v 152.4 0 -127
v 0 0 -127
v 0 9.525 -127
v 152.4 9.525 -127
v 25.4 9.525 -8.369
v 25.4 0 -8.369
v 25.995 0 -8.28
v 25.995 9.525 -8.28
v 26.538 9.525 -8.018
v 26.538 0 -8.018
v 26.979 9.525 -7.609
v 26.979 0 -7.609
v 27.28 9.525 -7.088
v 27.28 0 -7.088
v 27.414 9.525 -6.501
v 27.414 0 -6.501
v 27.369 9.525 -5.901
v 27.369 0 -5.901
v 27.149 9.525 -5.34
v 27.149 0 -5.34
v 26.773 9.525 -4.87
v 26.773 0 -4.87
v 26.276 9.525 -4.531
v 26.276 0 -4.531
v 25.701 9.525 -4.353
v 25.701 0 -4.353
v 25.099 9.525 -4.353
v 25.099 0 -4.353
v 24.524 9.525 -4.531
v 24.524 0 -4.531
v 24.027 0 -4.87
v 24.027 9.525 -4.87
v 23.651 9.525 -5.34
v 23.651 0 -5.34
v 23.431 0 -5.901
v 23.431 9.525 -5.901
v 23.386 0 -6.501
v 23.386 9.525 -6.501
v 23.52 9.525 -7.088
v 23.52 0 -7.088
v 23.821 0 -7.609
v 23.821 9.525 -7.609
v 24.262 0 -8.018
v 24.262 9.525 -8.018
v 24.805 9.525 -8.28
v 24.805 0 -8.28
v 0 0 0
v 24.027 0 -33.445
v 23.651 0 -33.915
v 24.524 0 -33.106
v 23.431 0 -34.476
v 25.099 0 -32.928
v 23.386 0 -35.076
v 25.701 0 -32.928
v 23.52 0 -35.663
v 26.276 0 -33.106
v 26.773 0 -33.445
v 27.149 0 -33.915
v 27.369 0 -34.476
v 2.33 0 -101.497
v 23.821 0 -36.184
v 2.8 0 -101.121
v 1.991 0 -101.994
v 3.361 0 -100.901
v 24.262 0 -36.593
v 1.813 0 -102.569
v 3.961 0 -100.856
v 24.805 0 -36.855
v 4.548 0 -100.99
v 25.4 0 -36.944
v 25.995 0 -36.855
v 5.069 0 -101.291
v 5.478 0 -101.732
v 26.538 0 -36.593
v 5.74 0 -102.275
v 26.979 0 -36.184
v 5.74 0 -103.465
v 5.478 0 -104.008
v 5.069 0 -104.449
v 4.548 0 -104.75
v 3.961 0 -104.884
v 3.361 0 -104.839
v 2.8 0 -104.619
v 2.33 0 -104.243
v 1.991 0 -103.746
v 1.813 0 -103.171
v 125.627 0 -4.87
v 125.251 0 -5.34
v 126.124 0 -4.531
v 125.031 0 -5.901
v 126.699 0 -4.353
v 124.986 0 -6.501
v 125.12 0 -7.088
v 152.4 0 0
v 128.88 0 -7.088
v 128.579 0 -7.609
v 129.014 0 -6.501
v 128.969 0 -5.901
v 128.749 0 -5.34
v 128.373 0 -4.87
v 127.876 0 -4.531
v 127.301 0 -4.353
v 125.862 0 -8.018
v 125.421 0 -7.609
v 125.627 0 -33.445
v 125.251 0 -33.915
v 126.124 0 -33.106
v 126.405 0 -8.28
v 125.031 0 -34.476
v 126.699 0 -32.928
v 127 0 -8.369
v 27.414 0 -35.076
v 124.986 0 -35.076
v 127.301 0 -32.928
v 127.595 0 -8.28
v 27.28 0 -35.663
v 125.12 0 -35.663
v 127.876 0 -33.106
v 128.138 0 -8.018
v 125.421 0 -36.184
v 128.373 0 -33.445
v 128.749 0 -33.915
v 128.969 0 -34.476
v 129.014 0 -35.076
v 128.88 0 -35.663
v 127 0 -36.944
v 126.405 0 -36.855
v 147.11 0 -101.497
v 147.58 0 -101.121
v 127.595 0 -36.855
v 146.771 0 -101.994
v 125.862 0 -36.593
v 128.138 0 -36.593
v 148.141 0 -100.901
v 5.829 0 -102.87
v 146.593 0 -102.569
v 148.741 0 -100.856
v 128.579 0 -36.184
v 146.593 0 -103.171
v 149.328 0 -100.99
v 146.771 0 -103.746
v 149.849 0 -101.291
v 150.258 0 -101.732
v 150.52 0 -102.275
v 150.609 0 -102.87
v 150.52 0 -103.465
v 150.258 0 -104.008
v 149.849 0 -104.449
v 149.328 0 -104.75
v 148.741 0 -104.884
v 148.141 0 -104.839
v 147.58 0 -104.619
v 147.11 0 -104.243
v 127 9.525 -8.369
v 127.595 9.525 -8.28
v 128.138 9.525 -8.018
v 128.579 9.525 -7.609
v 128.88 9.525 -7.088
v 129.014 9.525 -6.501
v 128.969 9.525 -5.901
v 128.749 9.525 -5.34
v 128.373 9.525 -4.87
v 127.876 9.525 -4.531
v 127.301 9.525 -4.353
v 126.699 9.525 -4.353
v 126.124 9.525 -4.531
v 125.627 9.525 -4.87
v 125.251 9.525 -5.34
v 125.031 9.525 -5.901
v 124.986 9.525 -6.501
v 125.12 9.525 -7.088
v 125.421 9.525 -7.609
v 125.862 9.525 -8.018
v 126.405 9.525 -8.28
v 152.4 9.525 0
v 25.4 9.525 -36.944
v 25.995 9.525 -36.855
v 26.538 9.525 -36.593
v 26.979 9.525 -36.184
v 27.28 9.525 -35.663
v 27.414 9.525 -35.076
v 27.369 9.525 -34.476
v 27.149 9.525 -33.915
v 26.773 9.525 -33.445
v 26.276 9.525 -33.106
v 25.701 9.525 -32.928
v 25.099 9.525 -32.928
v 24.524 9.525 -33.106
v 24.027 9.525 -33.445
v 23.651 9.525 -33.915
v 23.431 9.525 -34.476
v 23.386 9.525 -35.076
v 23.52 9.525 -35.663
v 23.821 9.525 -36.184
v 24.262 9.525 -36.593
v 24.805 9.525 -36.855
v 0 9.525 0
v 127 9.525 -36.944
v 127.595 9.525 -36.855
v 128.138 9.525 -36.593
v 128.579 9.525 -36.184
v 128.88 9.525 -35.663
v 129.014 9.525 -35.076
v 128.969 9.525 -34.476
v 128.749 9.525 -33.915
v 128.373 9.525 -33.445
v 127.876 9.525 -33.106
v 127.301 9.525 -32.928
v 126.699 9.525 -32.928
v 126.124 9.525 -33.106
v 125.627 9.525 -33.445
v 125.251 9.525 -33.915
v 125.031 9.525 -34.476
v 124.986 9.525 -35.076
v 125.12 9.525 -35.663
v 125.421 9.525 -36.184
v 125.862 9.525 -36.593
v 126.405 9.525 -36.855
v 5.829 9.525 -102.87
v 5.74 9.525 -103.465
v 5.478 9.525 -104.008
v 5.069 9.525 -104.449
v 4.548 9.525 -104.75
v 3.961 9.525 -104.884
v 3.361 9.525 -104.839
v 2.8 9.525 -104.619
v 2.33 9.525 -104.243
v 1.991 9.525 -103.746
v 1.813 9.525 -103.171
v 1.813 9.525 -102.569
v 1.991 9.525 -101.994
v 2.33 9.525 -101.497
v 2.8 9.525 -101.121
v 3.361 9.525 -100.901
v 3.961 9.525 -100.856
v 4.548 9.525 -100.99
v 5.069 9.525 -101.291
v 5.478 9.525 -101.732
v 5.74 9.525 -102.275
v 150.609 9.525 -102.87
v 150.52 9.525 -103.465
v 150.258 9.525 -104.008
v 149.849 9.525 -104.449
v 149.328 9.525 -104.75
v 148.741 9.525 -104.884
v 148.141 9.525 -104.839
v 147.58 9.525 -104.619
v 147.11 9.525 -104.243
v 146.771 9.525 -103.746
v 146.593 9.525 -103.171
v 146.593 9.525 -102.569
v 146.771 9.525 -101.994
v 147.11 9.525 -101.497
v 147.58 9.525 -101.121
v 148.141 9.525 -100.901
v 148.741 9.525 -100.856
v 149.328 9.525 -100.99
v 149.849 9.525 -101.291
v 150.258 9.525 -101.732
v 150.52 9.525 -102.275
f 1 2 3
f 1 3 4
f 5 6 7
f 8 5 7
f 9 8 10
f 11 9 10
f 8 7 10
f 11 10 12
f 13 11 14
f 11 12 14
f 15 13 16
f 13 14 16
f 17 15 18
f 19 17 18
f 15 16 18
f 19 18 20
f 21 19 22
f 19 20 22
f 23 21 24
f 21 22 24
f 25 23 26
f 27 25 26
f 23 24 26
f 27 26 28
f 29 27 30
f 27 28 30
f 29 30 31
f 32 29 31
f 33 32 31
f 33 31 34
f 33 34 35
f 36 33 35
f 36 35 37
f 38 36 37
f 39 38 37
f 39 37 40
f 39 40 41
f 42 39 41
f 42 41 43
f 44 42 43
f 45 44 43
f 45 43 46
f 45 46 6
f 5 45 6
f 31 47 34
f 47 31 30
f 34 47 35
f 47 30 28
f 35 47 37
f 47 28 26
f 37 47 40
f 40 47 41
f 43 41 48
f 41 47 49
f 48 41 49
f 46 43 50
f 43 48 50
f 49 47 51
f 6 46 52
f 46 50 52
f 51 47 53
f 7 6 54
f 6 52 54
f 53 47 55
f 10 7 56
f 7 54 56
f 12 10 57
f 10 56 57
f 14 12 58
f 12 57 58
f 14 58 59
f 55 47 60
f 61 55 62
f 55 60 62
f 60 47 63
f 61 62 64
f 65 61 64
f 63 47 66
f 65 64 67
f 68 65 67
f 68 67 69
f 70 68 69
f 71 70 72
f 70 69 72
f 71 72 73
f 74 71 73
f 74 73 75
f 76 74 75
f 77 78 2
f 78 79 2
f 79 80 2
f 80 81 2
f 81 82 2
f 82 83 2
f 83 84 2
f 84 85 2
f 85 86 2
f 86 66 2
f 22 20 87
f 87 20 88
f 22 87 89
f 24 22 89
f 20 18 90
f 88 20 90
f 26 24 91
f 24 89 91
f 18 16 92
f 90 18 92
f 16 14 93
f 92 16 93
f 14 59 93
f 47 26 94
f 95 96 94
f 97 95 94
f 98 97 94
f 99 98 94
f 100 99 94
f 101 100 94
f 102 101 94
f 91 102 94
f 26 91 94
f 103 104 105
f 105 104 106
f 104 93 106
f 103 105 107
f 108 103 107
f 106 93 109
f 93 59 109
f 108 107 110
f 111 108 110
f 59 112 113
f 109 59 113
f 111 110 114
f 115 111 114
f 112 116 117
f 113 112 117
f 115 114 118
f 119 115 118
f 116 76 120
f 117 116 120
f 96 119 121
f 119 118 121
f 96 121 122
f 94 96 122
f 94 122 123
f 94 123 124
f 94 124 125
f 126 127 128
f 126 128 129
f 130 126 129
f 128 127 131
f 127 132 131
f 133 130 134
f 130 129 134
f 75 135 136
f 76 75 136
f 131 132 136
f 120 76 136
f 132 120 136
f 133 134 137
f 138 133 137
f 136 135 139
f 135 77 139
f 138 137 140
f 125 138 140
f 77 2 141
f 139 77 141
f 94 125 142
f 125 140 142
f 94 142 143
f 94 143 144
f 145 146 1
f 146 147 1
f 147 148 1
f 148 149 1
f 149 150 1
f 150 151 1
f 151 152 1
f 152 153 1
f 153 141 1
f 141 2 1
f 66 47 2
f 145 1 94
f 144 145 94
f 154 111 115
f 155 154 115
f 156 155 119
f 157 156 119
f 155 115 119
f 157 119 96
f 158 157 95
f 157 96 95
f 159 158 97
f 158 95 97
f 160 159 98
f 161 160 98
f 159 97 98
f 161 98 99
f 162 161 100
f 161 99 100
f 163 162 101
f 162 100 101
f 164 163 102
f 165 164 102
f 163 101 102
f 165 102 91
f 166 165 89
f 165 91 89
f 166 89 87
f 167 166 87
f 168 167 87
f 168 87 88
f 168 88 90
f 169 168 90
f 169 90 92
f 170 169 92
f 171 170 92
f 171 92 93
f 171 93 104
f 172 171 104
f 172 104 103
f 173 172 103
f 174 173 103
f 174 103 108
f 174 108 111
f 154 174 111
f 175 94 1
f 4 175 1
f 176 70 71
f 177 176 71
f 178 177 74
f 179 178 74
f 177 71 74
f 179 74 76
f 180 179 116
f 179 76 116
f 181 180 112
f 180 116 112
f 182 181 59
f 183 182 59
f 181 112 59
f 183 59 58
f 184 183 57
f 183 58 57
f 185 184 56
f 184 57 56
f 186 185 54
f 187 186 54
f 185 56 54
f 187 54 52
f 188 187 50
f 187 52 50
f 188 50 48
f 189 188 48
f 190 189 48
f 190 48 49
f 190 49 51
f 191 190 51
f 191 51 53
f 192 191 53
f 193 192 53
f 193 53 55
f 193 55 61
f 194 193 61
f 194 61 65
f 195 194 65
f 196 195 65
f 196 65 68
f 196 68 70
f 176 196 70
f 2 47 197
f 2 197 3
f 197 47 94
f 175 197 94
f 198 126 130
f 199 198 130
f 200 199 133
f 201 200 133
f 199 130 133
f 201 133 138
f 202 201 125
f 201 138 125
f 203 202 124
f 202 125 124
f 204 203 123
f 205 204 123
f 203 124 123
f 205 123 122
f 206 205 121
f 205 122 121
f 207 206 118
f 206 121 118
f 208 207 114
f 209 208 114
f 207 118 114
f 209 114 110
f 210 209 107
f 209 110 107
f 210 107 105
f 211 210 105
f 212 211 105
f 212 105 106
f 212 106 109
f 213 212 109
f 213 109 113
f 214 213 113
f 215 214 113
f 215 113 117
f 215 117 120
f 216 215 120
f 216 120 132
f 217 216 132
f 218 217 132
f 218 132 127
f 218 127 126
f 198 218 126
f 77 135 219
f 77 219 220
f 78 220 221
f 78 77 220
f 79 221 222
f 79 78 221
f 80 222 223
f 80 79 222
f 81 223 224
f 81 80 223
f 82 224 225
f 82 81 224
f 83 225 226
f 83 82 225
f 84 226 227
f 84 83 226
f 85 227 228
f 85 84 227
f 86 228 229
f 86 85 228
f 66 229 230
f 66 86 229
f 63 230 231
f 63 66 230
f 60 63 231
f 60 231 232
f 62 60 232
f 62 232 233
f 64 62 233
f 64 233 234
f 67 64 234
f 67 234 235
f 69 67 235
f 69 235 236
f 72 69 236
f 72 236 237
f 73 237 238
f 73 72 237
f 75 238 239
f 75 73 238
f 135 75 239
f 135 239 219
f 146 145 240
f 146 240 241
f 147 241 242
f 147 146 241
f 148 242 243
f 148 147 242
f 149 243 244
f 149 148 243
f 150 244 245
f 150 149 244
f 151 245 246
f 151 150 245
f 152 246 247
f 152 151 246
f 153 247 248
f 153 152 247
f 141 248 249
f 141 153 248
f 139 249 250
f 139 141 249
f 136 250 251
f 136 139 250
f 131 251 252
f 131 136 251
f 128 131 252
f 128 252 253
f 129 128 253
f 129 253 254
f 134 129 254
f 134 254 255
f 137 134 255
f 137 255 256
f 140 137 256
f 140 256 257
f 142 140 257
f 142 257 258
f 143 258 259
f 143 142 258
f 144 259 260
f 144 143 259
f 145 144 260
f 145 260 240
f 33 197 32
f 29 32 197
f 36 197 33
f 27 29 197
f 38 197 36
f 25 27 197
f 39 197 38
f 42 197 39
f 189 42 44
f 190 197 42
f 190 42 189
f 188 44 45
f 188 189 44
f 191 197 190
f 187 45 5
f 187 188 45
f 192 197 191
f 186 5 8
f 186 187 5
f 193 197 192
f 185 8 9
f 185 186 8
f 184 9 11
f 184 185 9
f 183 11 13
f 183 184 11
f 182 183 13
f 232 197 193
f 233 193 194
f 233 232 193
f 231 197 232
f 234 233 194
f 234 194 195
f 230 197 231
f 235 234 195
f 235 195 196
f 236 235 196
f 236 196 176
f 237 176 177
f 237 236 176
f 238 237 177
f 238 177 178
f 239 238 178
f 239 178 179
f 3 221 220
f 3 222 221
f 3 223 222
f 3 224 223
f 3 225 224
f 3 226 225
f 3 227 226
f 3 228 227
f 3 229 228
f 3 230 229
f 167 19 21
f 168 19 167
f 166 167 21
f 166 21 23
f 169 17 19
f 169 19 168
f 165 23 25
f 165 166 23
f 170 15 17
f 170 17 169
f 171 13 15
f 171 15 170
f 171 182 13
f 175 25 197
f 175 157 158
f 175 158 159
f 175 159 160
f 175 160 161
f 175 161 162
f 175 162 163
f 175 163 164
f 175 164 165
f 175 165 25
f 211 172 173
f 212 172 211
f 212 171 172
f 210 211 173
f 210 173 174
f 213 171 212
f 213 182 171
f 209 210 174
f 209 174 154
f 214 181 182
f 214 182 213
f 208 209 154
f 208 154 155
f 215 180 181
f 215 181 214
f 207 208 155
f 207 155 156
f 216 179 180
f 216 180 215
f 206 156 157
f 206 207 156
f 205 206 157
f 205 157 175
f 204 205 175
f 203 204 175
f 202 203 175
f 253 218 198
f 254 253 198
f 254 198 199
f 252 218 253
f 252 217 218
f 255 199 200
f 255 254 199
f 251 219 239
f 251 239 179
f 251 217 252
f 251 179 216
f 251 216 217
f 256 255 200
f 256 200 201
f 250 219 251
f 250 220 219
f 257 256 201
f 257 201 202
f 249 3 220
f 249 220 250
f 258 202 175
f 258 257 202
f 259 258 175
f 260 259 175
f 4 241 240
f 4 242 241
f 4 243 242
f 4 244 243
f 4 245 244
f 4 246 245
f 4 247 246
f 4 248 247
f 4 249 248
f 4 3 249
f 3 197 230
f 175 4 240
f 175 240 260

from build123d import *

# Parameters (mm, degrees)
SKETCH1_W                      = 152.4
SKETCH1_H                      = 127
BOSS_EXTRUDE1_DEPTH            = 9.525
F_10_32_TAPPED_HOLE1_D         = 4.0386
F_10_32_TAPPED_HOLE2_OUTLINE_R = 2.0193
F_10_32_TAPPED_HOLE2_DEPTH     = 9.525


# Read off the part's stored shape, not the designer's step: #10-32 Tapped Hole2
with BuildPart() as part:
    # Sketch1 → Boss-Extrude1 (new body)
    with BuildSketch(Plane(origin=(0, 0, 0), x_dir=(1, 0, 0), z_dir=(0, 1, 0))):
        with Locations((76.2, 63.5)):
            Rectangle(SKETCH1_W, SKETCH1_H)
    extrude(amount=BOSS_EXTRUDE1_DEPTH)

    # #10-32 Tapped Hole1 (through all)
    with Locations(Plane(origin=(25.4, 9.525, -6.35), x_dir=(0, 0, 1), z_dir=(0, 1, 0))):
        with Locations((0, 0), (-28.575, 0), (-28.575, 101.6), (0, 101.6)):
            Hole(F_10_32_TAPPED_HOLE1_D / 2)

    # #10-32 Tapped Hole2 outline → #10-32 Tapped Hole2 (cut)
    with BuildSketch(Plane(origin=(0, 0, 0), x_dir=(1, 0, 0), z_dir=(0, 1, 0))):
        with Locations((148.59, 102.87)):
            Circle(F_10_32_TAPPED_HOLE2_OUTLINE_R)
        with Locations((3.81, 102.87)):
            Circle(F_10_32_TAPPED_HOLE2_OUTLINE_R)
    extrude(amount=F_10_32_TAPPED_HOLE2_DEPTH, mode=Mode.SUBTRACT)


solid = part.part
